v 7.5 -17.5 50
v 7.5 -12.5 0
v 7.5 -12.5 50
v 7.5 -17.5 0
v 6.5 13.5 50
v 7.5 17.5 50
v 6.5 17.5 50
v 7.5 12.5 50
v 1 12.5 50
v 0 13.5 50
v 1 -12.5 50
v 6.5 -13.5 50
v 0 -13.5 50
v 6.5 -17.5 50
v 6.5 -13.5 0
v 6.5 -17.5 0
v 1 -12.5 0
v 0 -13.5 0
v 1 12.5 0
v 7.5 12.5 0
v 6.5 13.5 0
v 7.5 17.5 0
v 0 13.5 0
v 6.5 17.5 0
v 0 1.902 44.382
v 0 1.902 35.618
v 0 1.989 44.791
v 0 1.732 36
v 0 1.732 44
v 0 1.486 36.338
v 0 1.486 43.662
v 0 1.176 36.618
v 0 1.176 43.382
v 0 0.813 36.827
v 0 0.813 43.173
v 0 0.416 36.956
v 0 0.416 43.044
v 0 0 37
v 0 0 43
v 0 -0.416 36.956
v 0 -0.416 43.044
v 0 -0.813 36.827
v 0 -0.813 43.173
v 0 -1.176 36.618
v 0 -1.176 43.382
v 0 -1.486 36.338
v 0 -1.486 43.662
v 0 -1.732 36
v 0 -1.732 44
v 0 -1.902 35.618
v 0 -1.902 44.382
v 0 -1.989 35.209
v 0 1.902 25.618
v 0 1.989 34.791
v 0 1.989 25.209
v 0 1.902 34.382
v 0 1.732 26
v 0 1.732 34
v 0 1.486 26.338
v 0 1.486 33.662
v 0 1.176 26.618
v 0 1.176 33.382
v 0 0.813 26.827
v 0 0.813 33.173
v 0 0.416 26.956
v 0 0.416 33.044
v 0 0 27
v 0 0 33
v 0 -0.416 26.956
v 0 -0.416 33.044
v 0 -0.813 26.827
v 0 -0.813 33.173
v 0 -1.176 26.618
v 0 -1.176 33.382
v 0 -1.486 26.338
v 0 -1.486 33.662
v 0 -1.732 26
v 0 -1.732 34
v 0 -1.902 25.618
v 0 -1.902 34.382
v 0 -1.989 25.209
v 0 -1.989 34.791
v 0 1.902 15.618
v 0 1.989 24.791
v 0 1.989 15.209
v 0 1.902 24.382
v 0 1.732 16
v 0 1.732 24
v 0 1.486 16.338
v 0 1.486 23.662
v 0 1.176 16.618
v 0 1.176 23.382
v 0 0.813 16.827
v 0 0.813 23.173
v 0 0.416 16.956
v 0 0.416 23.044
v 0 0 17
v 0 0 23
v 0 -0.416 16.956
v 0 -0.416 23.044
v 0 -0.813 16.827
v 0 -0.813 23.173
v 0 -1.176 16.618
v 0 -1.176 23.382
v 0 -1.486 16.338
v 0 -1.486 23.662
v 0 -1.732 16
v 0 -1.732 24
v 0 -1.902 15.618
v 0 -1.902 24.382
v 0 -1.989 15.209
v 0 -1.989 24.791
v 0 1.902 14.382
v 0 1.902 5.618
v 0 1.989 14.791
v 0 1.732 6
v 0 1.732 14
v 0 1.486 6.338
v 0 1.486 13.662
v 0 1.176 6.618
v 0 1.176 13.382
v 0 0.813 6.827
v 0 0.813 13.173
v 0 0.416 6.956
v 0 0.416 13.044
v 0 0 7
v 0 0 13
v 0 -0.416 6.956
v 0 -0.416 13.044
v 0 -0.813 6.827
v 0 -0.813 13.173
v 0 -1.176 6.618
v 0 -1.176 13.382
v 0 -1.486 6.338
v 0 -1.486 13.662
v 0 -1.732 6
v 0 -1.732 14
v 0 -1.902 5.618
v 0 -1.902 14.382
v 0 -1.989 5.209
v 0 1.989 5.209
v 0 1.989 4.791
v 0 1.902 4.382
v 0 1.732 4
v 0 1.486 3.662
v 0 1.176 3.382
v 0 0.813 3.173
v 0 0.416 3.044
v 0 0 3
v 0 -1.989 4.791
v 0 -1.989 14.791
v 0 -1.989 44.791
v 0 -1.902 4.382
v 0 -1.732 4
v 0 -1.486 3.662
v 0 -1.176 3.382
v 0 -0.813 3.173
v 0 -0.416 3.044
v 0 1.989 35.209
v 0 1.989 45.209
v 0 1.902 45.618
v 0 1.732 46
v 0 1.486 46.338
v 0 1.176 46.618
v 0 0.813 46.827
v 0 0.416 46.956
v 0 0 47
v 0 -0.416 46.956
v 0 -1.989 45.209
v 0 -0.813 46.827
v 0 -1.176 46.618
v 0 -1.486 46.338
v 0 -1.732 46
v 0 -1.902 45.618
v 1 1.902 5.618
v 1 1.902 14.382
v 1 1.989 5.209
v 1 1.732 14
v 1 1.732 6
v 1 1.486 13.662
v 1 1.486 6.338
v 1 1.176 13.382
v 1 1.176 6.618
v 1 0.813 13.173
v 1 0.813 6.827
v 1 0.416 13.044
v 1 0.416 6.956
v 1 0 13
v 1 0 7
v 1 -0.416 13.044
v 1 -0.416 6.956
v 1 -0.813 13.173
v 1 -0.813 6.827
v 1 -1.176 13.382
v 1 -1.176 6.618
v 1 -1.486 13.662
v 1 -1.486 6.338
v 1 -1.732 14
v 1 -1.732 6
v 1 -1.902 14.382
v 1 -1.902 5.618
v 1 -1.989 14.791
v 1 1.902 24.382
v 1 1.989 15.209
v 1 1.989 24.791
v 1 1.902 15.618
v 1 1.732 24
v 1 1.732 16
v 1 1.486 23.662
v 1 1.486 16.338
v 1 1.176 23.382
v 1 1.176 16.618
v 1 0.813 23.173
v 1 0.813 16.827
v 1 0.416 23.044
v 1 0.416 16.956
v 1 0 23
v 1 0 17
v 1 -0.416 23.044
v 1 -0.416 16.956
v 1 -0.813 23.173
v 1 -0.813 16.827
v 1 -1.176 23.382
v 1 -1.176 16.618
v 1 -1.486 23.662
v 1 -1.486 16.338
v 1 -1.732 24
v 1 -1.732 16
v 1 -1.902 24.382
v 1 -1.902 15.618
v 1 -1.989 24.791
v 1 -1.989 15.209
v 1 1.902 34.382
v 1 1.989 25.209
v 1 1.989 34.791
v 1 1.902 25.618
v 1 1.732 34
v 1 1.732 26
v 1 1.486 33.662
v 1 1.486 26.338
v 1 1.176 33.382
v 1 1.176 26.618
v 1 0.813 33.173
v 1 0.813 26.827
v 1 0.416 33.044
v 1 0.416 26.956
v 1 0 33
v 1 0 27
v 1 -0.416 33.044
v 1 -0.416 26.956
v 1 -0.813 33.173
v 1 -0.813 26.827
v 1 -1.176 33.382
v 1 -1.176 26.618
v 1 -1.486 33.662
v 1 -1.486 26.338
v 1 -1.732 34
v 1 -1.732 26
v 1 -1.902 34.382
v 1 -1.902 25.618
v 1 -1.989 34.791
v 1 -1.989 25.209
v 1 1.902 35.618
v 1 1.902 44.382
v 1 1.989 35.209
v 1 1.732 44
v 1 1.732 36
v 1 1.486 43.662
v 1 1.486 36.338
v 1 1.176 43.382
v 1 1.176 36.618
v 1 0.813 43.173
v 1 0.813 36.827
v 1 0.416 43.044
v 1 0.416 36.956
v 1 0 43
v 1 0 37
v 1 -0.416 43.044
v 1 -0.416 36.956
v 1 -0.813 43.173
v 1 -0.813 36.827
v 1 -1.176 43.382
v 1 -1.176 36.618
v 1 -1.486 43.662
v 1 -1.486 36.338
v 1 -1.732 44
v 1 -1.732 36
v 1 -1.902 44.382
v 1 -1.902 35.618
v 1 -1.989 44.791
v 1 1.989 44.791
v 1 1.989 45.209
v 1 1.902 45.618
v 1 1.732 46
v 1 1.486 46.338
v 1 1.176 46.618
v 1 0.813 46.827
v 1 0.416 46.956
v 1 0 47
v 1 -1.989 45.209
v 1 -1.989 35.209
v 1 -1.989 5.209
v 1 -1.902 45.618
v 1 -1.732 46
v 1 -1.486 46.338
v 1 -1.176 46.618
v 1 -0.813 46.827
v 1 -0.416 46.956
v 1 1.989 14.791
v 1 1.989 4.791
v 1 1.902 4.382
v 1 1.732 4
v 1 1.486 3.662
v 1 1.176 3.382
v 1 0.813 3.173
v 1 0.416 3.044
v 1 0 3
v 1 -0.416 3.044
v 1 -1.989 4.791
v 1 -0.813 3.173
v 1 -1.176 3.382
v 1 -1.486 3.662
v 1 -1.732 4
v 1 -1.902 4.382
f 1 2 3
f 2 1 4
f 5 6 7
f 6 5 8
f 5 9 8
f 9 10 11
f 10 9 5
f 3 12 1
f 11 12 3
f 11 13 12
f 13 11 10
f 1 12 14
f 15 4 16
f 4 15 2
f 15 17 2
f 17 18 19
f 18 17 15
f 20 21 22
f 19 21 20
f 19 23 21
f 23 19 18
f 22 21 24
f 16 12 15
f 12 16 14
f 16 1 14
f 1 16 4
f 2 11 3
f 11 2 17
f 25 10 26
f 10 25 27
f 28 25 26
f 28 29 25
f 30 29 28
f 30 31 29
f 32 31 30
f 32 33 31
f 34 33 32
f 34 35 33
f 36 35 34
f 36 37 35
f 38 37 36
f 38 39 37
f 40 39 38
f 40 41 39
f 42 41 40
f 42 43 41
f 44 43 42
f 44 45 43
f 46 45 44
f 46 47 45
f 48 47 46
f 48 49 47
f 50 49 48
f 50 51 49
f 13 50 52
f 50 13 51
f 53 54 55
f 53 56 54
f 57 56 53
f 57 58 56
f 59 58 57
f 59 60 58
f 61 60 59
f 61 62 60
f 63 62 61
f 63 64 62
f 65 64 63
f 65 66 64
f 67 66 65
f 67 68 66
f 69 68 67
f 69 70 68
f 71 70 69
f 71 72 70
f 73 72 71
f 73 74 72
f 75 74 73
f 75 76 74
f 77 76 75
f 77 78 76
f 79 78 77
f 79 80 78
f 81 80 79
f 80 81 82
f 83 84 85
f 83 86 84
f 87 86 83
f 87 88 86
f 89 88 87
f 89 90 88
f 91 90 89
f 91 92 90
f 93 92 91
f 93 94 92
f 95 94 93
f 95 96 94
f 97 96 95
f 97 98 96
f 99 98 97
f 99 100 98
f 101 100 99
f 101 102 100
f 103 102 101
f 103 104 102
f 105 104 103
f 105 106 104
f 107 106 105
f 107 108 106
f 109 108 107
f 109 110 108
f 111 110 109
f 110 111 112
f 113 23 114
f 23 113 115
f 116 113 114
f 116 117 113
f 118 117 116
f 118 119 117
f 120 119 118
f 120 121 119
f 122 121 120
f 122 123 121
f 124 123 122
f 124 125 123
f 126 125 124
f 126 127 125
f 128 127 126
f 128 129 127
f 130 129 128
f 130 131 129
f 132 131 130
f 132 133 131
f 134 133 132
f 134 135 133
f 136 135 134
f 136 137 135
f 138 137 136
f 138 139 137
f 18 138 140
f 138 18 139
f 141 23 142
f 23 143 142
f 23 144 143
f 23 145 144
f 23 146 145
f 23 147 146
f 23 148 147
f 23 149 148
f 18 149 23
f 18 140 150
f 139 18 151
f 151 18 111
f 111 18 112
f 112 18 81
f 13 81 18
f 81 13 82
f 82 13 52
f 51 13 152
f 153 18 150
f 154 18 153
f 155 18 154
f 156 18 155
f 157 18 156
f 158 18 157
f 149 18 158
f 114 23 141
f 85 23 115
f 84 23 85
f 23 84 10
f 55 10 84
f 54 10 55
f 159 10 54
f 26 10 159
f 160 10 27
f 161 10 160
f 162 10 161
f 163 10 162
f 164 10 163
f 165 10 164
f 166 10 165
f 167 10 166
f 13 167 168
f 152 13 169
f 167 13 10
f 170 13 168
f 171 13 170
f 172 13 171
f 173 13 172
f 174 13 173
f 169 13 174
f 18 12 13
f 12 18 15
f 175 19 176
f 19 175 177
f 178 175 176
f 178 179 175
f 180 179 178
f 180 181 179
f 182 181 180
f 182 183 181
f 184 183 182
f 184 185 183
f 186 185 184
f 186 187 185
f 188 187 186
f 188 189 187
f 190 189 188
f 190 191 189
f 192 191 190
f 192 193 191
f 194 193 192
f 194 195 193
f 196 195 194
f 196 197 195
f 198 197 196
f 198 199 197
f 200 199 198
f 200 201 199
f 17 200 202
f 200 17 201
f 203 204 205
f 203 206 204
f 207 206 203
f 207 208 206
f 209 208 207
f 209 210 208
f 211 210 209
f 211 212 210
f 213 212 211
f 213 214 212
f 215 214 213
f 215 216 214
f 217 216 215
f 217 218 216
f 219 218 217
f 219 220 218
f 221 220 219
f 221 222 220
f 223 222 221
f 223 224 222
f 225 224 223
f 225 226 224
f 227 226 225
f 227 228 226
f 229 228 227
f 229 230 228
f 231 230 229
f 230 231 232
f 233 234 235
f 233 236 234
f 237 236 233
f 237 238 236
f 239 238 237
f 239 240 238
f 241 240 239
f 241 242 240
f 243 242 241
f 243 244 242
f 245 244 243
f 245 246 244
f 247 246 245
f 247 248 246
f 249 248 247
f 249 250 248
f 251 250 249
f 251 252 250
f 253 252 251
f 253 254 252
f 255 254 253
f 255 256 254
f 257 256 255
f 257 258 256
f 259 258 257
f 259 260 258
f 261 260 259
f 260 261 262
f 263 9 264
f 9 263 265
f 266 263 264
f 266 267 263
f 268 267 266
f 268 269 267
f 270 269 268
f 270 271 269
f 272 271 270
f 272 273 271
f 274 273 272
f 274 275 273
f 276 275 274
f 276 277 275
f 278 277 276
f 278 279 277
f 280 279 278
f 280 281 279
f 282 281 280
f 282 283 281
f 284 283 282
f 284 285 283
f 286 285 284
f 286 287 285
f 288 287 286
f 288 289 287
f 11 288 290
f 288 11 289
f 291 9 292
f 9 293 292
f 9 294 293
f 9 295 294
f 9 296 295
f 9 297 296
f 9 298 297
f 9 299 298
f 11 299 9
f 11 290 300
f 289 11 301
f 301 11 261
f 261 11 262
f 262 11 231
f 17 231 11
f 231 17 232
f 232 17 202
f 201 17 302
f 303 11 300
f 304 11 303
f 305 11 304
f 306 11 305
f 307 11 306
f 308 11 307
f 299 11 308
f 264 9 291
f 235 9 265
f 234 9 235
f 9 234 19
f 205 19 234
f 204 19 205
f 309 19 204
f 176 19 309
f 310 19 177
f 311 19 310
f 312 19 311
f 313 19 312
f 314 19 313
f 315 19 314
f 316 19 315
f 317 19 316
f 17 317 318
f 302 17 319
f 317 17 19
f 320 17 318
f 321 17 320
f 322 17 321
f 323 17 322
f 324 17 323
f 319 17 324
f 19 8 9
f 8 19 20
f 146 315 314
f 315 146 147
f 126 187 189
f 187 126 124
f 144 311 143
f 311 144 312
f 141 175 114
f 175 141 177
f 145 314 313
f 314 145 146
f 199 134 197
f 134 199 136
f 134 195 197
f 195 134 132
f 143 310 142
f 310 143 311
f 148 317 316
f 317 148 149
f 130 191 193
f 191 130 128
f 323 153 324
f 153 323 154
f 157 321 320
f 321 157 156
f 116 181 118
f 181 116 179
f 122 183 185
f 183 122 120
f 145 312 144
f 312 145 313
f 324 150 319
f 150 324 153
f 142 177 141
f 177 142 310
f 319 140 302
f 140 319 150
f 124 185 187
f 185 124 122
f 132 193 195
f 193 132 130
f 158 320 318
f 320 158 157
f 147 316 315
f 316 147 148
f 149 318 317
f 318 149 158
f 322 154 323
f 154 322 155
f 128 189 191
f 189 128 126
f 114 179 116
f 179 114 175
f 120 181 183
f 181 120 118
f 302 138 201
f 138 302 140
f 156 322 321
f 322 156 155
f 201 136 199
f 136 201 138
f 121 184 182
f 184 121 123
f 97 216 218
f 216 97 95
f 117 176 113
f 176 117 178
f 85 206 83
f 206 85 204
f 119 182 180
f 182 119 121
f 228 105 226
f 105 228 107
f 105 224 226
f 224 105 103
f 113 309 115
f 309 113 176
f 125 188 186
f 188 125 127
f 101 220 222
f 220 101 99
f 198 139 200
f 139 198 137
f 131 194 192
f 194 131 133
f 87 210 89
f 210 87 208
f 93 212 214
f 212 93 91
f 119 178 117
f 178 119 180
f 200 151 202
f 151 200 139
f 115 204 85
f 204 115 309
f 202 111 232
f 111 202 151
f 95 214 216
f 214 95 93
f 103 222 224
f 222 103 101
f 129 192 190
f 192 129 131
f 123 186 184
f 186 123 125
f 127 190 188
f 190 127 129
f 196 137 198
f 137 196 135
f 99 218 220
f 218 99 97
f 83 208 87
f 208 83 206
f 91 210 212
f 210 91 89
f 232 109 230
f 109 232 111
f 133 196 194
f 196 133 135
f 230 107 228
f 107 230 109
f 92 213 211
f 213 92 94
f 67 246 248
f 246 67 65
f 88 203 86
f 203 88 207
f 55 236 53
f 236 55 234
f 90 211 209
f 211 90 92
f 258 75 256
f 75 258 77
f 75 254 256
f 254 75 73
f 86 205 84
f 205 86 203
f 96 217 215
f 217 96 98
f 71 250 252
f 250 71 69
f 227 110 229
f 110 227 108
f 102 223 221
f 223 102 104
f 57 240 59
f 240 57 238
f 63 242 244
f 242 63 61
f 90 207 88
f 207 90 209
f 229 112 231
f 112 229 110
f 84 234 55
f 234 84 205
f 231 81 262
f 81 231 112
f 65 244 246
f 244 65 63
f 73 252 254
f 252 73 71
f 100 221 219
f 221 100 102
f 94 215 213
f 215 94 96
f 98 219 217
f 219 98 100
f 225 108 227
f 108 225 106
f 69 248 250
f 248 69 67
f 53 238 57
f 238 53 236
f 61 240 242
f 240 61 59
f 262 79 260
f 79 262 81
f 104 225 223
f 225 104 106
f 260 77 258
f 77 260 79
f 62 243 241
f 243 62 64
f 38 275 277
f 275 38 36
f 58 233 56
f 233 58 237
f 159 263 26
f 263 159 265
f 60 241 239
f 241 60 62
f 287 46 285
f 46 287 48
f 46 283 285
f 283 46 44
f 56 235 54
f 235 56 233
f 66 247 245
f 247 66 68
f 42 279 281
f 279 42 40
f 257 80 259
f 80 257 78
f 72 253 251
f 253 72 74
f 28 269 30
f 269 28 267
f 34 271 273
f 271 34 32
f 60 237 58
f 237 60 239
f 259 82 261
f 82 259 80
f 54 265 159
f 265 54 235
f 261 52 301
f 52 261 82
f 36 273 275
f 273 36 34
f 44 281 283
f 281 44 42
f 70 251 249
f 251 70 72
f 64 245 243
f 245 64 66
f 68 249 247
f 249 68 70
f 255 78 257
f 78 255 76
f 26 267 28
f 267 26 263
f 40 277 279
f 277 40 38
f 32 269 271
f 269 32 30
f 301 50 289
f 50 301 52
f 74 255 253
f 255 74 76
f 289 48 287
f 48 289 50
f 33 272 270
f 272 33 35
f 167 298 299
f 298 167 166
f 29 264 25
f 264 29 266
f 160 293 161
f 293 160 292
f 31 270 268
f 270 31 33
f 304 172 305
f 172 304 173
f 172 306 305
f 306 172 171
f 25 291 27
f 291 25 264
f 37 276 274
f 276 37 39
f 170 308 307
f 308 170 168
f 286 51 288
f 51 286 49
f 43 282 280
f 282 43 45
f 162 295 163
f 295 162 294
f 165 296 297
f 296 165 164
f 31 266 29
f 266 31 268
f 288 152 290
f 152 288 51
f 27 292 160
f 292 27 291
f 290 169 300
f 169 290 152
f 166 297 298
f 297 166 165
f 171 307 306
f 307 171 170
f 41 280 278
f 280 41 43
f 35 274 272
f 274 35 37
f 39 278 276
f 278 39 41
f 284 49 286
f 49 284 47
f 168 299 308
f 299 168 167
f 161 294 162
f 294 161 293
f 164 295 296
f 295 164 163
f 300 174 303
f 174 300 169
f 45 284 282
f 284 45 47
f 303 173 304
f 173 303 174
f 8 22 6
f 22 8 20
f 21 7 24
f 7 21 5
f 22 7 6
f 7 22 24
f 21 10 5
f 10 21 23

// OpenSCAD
// ====================================================================
//  Parameters
// ====================================================================

hole = 4; //hole diamter

// ====================================================================
//  Public
// ====================================================================

module din_rail(length) {
    translate([6.5,25/2,0])
        cube([1,5,length]);
        
    translate([0,25/2,0])
        cube([7.5,1,length]);;

    mirror([0,1,0]) {      
        translate([6.5,25/2,0]) {
            cube([1,5,length]);
        }
        translate([0,25/2,0]){
            cube([7.5,1,length]);
        };
    ;}

    for(i= [10:10:length]) {
        difference() {
            translate([0,-25/2,i-10])
                cube([1,25,10]);
            b = i-5;
            translate([-2,0,b])
                rotate([0,90,0])  
                    cylinder(4,hole/2,hole/2, $fn=30);
            
        }
    }  
}

// ====================================================================
//  Example
// ====================================================================

din_rail(50);
